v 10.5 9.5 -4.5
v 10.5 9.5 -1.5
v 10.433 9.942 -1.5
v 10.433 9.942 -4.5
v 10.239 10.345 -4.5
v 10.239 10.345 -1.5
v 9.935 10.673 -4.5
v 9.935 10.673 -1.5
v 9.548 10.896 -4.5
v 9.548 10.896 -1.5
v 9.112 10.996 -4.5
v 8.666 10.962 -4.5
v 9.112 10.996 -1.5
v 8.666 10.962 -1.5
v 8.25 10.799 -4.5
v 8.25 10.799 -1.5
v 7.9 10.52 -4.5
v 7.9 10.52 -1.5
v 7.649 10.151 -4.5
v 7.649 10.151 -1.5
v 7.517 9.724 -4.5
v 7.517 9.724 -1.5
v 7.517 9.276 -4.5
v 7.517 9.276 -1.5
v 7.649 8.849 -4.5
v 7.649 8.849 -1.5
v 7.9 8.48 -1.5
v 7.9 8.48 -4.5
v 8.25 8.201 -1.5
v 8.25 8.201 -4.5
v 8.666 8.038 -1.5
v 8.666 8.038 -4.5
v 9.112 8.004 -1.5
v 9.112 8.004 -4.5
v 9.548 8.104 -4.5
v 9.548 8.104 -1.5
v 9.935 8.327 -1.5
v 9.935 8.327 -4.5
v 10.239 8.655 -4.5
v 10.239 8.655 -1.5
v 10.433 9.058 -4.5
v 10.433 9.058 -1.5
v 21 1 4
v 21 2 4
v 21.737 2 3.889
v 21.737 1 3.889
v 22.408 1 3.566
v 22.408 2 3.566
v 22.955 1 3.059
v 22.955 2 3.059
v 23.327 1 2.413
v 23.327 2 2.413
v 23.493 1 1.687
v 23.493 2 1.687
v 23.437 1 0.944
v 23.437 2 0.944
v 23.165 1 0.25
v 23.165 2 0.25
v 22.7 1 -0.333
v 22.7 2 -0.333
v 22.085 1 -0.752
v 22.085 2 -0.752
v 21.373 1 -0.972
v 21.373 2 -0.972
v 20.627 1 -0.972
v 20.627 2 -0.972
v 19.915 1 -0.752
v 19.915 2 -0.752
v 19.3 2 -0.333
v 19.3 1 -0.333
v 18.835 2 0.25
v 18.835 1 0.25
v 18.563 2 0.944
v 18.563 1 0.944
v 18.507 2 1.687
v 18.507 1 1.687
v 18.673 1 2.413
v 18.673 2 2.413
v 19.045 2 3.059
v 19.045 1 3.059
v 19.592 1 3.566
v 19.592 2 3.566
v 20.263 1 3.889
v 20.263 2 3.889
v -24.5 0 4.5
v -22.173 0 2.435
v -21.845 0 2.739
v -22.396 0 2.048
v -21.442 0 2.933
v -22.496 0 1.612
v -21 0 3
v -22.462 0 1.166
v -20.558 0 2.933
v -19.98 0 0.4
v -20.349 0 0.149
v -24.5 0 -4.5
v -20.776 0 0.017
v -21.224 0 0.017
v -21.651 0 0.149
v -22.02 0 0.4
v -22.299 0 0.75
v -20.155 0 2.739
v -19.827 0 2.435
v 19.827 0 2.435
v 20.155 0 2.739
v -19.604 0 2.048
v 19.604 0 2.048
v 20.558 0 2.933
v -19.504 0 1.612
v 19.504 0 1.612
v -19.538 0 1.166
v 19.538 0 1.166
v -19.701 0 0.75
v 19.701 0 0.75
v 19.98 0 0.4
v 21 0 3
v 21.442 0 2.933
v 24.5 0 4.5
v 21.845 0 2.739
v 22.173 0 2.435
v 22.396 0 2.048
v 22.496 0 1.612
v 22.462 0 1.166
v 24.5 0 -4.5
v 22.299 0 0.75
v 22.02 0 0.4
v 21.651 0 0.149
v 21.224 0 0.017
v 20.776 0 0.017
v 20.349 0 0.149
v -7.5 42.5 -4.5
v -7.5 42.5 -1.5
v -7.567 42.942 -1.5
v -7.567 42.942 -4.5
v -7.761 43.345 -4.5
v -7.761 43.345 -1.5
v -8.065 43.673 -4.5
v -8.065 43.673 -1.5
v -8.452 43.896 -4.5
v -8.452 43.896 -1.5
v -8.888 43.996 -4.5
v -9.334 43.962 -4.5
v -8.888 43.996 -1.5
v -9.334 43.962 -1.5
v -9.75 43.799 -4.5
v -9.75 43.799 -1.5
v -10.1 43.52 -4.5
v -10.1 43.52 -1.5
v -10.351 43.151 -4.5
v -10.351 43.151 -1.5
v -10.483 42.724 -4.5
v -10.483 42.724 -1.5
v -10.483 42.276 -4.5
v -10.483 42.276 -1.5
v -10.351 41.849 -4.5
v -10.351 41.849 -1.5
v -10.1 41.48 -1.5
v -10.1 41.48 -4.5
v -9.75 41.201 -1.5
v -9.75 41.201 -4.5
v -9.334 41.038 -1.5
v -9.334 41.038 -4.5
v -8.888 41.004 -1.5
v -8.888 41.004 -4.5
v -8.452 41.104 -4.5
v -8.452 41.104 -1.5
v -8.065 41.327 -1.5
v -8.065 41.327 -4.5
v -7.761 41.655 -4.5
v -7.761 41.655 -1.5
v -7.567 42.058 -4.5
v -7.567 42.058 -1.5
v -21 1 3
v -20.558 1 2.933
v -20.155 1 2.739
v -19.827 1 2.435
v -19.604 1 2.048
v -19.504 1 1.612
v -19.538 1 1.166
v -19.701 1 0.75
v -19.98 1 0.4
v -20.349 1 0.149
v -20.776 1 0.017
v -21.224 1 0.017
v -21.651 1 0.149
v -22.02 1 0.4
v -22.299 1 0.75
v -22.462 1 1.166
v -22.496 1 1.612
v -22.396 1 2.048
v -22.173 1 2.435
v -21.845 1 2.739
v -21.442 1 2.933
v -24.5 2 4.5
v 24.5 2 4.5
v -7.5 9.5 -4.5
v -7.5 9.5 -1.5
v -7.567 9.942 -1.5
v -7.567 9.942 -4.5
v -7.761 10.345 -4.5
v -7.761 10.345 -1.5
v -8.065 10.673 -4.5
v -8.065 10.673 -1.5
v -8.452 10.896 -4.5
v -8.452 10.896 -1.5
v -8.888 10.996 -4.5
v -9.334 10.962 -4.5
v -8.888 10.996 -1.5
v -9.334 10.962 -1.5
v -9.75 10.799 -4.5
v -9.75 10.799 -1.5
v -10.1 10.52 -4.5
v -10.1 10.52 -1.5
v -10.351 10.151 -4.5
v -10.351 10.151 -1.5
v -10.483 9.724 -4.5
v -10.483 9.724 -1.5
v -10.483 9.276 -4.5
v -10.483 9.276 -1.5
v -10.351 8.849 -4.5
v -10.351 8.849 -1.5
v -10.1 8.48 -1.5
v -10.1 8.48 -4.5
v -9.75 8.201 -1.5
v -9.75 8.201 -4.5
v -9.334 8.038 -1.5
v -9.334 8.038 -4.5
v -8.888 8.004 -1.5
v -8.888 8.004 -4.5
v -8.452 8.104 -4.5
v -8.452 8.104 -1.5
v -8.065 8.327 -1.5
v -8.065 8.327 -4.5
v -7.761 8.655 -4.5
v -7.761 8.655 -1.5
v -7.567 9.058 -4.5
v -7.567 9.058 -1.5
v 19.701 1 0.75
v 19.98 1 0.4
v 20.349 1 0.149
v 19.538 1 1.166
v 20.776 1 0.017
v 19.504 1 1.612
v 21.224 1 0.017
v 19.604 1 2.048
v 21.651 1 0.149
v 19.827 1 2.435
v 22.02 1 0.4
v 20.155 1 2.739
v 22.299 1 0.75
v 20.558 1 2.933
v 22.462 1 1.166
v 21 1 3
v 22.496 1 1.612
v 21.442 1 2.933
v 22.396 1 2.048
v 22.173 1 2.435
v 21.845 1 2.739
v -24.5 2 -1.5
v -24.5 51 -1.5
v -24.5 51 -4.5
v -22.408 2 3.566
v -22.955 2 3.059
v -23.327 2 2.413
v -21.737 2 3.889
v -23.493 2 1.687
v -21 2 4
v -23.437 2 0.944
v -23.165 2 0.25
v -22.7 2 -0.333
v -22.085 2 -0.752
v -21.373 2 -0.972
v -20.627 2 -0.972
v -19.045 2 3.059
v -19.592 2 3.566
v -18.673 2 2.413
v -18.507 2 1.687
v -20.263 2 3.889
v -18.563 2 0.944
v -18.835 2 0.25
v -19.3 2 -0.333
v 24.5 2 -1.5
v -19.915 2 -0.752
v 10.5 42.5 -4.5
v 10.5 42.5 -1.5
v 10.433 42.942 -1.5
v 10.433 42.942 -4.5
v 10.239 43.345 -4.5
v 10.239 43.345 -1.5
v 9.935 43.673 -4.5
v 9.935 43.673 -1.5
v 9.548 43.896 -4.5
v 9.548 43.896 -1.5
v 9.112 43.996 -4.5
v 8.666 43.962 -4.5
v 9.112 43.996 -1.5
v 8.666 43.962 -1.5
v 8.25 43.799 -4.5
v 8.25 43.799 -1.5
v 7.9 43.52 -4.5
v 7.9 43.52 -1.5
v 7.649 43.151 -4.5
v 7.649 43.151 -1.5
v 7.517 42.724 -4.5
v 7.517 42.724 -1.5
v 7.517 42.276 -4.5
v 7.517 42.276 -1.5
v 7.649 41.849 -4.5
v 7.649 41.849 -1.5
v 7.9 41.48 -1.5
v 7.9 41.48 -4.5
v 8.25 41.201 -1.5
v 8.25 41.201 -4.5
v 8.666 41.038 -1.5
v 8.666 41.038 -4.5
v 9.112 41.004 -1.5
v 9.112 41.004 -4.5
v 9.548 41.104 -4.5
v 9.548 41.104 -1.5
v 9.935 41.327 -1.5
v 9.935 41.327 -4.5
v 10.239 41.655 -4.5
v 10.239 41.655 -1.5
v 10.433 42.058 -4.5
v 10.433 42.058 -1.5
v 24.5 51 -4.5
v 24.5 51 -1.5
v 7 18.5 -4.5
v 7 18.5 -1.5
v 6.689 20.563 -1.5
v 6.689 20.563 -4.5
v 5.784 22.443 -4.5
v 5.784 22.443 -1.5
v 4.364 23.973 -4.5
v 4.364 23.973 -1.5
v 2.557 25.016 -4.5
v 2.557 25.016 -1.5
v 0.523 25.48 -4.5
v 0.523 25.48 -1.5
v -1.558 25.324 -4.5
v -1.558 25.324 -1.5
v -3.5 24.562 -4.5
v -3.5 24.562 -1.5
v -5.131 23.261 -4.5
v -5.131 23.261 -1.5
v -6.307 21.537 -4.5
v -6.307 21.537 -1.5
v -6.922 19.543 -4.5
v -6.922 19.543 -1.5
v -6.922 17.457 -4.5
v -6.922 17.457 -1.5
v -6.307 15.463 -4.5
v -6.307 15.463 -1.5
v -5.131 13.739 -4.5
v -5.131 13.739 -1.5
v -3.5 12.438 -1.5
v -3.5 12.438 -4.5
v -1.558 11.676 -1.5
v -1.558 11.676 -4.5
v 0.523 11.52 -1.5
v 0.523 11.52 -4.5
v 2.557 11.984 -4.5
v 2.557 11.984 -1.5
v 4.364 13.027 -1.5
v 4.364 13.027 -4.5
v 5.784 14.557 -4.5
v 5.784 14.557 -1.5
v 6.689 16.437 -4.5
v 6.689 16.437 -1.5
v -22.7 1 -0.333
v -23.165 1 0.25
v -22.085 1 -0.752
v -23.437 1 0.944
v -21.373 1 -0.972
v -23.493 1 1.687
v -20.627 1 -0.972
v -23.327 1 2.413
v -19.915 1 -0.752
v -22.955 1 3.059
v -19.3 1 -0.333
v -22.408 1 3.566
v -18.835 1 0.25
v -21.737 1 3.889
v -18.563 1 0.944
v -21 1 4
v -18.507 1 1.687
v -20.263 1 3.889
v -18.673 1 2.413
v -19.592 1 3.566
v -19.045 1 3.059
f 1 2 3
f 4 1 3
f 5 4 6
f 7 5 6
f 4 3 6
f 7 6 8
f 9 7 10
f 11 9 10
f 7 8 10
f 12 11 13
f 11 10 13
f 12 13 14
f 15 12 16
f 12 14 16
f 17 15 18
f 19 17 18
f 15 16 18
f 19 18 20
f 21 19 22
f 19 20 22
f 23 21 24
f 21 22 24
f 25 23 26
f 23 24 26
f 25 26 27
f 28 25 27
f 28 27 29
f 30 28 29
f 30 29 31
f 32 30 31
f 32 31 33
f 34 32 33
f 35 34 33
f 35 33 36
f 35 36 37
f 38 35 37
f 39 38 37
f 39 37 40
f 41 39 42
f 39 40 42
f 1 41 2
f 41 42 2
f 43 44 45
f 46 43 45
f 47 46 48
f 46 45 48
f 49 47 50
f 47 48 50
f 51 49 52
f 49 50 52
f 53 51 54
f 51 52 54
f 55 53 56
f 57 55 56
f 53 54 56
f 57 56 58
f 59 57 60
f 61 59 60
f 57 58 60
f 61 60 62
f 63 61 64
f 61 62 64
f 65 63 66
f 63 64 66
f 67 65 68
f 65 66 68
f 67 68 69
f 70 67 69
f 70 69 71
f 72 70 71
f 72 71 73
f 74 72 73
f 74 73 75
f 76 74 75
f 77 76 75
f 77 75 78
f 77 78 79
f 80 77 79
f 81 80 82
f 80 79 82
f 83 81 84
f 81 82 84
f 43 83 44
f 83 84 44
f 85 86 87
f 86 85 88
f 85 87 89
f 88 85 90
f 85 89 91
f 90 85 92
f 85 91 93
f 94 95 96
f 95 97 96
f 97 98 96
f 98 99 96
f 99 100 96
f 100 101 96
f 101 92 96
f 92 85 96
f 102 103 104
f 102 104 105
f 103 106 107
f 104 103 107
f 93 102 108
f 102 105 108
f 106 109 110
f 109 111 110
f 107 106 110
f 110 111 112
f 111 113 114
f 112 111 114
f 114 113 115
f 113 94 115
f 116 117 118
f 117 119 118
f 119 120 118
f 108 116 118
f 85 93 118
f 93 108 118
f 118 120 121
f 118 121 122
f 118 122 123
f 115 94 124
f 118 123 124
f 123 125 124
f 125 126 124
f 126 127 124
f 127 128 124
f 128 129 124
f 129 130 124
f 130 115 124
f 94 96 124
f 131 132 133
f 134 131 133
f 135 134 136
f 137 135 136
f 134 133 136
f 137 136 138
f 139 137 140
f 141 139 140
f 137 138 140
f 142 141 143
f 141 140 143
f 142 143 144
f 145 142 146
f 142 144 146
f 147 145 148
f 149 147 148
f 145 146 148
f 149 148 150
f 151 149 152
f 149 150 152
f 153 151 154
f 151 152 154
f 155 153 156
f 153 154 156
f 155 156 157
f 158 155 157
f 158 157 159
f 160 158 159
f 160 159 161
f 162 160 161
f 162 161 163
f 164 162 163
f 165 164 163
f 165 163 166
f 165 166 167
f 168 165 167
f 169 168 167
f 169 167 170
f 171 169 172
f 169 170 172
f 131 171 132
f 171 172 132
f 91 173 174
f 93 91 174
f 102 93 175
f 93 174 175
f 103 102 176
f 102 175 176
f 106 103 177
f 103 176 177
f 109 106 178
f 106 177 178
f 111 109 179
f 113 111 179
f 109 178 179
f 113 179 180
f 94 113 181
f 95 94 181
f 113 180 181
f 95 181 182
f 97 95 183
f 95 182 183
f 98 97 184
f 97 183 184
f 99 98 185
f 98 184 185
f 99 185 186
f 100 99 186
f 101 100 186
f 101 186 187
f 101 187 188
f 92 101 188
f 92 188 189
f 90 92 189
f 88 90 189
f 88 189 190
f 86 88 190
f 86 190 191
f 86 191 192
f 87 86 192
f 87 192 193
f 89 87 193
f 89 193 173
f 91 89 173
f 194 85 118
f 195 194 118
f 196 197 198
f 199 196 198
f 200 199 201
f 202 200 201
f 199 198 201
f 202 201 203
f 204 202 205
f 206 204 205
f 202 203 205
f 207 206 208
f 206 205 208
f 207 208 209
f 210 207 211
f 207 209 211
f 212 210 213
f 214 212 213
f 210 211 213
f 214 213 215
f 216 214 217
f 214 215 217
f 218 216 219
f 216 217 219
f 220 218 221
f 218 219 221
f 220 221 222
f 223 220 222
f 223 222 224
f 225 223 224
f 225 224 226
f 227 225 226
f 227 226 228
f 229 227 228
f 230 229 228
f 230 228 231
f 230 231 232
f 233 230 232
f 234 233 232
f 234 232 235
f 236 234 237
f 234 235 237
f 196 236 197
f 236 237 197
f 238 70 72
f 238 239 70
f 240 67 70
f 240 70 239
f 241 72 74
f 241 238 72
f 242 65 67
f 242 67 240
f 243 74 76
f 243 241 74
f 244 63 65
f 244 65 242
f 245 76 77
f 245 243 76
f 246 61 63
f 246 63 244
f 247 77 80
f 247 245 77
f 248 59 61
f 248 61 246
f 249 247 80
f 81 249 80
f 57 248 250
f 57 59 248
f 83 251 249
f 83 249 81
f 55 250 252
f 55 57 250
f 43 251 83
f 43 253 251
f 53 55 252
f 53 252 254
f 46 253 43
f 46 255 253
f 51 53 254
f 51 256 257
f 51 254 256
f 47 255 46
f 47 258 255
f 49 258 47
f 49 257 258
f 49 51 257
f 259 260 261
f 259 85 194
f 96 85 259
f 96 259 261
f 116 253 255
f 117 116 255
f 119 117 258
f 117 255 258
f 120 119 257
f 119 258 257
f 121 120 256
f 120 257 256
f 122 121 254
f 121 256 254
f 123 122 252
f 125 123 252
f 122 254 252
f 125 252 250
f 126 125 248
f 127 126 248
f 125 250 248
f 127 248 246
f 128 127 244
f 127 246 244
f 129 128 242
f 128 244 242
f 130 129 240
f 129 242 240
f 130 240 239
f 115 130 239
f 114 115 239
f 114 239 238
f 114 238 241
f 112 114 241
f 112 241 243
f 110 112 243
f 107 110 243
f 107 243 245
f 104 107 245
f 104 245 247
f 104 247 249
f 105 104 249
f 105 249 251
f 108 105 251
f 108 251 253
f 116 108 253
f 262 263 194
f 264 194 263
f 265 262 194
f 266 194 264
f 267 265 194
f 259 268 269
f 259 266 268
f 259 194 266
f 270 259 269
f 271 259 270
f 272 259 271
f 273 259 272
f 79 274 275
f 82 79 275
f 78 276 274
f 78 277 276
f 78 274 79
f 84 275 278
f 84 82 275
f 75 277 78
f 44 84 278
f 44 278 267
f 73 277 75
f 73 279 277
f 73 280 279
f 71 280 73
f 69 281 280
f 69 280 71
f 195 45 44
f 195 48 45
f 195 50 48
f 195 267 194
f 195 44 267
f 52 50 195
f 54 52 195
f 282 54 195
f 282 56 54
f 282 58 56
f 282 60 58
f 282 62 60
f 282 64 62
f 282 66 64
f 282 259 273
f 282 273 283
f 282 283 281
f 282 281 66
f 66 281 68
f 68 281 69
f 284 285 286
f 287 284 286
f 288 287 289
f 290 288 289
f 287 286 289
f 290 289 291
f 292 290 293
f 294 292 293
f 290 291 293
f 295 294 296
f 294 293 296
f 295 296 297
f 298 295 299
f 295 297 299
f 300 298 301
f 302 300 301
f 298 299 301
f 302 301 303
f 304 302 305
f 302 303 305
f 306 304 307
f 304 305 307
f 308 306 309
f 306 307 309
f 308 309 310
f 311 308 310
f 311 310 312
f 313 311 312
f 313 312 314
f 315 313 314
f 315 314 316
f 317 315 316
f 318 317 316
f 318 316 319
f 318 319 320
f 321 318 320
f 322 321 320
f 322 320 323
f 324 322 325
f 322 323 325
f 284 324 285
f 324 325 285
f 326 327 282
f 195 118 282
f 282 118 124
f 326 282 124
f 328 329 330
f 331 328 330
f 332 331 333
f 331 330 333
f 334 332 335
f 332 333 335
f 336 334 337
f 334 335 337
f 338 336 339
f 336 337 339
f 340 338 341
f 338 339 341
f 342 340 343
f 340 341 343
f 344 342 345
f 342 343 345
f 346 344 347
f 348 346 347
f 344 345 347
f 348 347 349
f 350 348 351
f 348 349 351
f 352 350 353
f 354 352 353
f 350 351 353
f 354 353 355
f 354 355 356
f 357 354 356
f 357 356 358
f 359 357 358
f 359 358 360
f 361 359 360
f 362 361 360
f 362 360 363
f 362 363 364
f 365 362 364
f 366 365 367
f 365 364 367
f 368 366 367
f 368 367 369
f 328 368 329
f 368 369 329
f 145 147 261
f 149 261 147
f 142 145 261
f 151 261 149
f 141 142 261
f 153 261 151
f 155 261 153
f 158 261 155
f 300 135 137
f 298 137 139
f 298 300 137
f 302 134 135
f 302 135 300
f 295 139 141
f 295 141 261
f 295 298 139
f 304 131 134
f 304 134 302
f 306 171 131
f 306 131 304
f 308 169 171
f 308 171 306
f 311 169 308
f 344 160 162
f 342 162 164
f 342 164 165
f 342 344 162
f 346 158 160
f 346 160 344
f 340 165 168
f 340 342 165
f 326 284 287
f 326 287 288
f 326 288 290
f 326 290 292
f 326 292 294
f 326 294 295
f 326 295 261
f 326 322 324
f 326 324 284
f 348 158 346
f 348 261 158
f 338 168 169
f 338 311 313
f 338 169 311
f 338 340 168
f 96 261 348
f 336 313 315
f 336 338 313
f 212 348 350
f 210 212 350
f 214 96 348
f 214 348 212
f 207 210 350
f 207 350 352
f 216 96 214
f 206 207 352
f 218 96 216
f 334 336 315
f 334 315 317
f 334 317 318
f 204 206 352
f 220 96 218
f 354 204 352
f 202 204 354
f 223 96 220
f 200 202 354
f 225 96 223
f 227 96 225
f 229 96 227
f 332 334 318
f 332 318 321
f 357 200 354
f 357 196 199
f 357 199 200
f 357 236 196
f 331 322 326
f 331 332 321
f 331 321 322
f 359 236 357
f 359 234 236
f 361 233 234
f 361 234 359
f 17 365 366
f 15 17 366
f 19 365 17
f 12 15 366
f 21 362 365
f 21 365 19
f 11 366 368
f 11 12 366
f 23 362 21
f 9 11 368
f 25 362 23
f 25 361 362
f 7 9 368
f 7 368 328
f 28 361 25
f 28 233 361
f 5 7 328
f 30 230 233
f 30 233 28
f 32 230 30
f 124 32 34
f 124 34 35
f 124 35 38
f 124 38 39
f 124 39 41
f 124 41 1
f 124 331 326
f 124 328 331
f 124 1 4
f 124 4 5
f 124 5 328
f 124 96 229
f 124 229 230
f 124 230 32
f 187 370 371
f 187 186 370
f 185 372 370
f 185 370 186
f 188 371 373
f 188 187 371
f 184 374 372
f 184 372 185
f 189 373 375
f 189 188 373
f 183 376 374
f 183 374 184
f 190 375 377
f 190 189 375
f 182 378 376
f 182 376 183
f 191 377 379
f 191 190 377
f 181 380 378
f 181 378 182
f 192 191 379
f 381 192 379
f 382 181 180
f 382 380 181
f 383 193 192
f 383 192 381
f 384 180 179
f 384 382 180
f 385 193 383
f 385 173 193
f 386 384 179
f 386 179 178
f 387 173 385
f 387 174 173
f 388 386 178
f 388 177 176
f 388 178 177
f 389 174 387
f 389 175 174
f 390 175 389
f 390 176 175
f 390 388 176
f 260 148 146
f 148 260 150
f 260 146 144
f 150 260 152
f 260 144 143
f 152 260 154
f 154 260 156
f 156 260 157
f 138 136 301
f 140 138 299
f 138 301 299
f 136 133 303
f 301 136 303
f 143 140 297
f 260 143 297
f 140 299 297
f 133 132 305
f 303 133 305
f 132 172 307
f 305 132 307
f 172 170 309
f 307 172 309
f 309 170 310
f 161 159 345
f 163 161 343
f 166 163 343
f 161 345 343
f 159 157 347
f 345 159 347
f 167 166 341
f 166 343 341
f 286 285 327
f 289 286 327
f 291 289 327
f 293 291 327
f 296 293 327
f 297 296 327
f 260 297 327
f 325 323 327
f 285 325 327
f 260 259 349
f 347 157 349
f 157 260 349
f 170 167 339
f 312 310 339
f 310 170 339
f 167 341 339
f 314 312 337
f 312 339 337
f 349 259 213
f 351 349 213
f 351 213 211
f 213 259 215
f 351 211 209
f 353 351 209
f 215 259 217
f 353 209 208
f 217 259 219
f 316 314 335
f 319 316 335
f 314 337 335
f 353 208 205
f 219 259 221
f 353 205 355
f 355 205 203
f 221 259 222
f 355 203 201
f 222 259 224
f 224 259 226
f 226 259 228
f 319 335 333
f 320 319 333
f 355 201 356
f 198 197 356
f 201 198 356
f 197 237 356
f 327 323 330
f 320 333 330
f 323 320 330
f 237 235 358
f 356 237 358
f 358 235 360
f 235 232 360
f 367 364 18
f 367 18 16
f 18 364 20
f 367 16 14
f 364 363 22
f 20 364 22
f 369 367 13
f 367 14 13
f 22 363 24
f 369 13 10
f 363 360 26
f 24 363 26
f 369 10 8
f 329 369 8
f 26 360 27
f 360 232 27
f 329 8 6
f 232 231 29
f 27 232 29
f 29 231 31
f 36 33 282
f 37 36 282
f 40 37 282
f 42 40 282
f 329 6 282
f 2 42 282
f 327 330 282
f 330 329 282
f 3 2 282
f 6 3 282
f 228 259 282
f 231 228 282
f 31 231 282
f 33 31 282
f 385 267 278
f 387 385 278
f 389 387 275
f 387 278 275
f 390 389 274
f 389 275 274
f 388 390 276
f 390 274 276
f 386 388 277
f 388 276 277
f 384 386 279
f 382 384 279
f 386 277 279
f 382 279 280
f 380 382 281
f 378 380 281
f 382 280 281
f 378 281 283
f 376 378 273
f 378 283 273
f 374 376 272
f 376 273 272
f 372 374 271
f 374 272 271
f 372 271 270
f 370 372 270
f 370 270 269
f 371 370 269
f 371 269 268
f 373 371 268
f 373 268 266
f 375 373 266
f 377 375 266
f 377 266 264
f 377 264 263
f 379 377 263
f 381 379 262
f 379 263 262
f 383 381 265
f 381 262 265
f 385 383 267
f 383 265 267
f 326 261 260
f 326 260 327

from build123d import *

# Parameters (mm, degrees)
SKETCH1_W           = 49
SKETCH1_H           = 9
BOSS_EXTRUDE1_DEPTH = 2
SKETCH2_W           = 49
SKETCH2_H           = 3
BOSS_EXTRUDE2_DEPTH = 49
SKETCH3_R           = 1.5
SKETCH3_R_2         = 7
CUT_EXTRUDE1_DEPTH  = 3
SKETCH4_R           = 2.5
CUT_EXTRUDE2_DEPTH  = 1
SKETCH5_R           = 1.5
CUT_EXTRUDE3_DEPTH  = 2
SKETCH6_R           = 1.5
CUT_EXTRUDE4_DEPTH  = 2


with BuildPart() as part:
    # Sketch1 → Boss-Extrude1 (new body)
    with BuildSketch(Plane(origin=(0, 0, 0), x_dir=(1, 0, 0), z_dir=(0, 1, 0))):
        Rectangle(SKETCH1_W, SKETCH1_H)
    extrude(amount=BOSS_EXTRUDE1_DEPTH)

    # Sketch2 → Boss-Extrude2 (add)
    with BuildSketch(Plane(origin=(0, 2, 0), x_dir=(1, 0, 0), z_dir=(0, 1, 0))):
        with Locations((0, 3)):
            Rectangle(SKETCH2_W, SKETCH2_H)
    extrude(amount=BOSS_EXTRUDE2_DEPTH)

    # Sketch3 → Cut-Extrude1 (cut)
    with BuildSketch(Plane.XY.offset(-1.5)):
        with Locations((-9, 9.5)):
            Circle(SKETCH3_R)
        with Locations((9, 9.5)):
            Circle(SKETCH3_R)
        with Locations((-9, 42.5)):
            Circle(SKETCH3_R)
        with Locations((9, 42.5)):
            Circle(SKETCH3_R)
        with Locations((0, 18.5)):
            Circle(SKETCH3_R_2)
    extrude(amount=-CUT_EXTRUDE1_DEPTH, mode=Mode.SUBTRACT)

    # Sketch4 → Cut-Extrude2 (cut)
    with BuildSketch(Plane(origin=(0, 2, 0), x_dir=(1, 0, 0), z_dir=(0, 1, 0))):
        with Locations(Location((-21, -1.5, 0), (0, 0, 270))):
            Circle(SKETCH4_R)
        with Locations(Location((21, -1.5, 0), (0, 0, 270))):
            Circle(SKETCH4_R)
    extrude(amount=-CUT_EXTRUDE2_DEPTH, mode=Mode.SUBTRACT)

    # Sketch5 → Cut-Extrude3 (cut)
    with BuildSketch(Plane(origin=(0, 1, 0), x_dir=(1, 0, 0), z_dir=(0, 1, 0))):
        with Locations(Location((-21, -1.5, 0), (0, 0, 270))):
            Circle(SKETCH5_R)
    extrude(amount=-CUT_EXTRUDE3_DEPTH, mode=Mode.SUBTRACT)

    # Sketch6 → Cut-Extrude4 (cut)
    with BuildSketch(Plane(origin=(0, 1, 0), x_dir=(1, 0, 0), z_dir=(0, 1, 0))):
        with Locations(Location((21, -1.5, 0), (0, 0, 270))):
            Circle(SKETCH6_R)
    extrude(amount=-CUT_EXTRUDE4_DEPTH, mode=Mode.SUBTRACT)


solid = part.part
